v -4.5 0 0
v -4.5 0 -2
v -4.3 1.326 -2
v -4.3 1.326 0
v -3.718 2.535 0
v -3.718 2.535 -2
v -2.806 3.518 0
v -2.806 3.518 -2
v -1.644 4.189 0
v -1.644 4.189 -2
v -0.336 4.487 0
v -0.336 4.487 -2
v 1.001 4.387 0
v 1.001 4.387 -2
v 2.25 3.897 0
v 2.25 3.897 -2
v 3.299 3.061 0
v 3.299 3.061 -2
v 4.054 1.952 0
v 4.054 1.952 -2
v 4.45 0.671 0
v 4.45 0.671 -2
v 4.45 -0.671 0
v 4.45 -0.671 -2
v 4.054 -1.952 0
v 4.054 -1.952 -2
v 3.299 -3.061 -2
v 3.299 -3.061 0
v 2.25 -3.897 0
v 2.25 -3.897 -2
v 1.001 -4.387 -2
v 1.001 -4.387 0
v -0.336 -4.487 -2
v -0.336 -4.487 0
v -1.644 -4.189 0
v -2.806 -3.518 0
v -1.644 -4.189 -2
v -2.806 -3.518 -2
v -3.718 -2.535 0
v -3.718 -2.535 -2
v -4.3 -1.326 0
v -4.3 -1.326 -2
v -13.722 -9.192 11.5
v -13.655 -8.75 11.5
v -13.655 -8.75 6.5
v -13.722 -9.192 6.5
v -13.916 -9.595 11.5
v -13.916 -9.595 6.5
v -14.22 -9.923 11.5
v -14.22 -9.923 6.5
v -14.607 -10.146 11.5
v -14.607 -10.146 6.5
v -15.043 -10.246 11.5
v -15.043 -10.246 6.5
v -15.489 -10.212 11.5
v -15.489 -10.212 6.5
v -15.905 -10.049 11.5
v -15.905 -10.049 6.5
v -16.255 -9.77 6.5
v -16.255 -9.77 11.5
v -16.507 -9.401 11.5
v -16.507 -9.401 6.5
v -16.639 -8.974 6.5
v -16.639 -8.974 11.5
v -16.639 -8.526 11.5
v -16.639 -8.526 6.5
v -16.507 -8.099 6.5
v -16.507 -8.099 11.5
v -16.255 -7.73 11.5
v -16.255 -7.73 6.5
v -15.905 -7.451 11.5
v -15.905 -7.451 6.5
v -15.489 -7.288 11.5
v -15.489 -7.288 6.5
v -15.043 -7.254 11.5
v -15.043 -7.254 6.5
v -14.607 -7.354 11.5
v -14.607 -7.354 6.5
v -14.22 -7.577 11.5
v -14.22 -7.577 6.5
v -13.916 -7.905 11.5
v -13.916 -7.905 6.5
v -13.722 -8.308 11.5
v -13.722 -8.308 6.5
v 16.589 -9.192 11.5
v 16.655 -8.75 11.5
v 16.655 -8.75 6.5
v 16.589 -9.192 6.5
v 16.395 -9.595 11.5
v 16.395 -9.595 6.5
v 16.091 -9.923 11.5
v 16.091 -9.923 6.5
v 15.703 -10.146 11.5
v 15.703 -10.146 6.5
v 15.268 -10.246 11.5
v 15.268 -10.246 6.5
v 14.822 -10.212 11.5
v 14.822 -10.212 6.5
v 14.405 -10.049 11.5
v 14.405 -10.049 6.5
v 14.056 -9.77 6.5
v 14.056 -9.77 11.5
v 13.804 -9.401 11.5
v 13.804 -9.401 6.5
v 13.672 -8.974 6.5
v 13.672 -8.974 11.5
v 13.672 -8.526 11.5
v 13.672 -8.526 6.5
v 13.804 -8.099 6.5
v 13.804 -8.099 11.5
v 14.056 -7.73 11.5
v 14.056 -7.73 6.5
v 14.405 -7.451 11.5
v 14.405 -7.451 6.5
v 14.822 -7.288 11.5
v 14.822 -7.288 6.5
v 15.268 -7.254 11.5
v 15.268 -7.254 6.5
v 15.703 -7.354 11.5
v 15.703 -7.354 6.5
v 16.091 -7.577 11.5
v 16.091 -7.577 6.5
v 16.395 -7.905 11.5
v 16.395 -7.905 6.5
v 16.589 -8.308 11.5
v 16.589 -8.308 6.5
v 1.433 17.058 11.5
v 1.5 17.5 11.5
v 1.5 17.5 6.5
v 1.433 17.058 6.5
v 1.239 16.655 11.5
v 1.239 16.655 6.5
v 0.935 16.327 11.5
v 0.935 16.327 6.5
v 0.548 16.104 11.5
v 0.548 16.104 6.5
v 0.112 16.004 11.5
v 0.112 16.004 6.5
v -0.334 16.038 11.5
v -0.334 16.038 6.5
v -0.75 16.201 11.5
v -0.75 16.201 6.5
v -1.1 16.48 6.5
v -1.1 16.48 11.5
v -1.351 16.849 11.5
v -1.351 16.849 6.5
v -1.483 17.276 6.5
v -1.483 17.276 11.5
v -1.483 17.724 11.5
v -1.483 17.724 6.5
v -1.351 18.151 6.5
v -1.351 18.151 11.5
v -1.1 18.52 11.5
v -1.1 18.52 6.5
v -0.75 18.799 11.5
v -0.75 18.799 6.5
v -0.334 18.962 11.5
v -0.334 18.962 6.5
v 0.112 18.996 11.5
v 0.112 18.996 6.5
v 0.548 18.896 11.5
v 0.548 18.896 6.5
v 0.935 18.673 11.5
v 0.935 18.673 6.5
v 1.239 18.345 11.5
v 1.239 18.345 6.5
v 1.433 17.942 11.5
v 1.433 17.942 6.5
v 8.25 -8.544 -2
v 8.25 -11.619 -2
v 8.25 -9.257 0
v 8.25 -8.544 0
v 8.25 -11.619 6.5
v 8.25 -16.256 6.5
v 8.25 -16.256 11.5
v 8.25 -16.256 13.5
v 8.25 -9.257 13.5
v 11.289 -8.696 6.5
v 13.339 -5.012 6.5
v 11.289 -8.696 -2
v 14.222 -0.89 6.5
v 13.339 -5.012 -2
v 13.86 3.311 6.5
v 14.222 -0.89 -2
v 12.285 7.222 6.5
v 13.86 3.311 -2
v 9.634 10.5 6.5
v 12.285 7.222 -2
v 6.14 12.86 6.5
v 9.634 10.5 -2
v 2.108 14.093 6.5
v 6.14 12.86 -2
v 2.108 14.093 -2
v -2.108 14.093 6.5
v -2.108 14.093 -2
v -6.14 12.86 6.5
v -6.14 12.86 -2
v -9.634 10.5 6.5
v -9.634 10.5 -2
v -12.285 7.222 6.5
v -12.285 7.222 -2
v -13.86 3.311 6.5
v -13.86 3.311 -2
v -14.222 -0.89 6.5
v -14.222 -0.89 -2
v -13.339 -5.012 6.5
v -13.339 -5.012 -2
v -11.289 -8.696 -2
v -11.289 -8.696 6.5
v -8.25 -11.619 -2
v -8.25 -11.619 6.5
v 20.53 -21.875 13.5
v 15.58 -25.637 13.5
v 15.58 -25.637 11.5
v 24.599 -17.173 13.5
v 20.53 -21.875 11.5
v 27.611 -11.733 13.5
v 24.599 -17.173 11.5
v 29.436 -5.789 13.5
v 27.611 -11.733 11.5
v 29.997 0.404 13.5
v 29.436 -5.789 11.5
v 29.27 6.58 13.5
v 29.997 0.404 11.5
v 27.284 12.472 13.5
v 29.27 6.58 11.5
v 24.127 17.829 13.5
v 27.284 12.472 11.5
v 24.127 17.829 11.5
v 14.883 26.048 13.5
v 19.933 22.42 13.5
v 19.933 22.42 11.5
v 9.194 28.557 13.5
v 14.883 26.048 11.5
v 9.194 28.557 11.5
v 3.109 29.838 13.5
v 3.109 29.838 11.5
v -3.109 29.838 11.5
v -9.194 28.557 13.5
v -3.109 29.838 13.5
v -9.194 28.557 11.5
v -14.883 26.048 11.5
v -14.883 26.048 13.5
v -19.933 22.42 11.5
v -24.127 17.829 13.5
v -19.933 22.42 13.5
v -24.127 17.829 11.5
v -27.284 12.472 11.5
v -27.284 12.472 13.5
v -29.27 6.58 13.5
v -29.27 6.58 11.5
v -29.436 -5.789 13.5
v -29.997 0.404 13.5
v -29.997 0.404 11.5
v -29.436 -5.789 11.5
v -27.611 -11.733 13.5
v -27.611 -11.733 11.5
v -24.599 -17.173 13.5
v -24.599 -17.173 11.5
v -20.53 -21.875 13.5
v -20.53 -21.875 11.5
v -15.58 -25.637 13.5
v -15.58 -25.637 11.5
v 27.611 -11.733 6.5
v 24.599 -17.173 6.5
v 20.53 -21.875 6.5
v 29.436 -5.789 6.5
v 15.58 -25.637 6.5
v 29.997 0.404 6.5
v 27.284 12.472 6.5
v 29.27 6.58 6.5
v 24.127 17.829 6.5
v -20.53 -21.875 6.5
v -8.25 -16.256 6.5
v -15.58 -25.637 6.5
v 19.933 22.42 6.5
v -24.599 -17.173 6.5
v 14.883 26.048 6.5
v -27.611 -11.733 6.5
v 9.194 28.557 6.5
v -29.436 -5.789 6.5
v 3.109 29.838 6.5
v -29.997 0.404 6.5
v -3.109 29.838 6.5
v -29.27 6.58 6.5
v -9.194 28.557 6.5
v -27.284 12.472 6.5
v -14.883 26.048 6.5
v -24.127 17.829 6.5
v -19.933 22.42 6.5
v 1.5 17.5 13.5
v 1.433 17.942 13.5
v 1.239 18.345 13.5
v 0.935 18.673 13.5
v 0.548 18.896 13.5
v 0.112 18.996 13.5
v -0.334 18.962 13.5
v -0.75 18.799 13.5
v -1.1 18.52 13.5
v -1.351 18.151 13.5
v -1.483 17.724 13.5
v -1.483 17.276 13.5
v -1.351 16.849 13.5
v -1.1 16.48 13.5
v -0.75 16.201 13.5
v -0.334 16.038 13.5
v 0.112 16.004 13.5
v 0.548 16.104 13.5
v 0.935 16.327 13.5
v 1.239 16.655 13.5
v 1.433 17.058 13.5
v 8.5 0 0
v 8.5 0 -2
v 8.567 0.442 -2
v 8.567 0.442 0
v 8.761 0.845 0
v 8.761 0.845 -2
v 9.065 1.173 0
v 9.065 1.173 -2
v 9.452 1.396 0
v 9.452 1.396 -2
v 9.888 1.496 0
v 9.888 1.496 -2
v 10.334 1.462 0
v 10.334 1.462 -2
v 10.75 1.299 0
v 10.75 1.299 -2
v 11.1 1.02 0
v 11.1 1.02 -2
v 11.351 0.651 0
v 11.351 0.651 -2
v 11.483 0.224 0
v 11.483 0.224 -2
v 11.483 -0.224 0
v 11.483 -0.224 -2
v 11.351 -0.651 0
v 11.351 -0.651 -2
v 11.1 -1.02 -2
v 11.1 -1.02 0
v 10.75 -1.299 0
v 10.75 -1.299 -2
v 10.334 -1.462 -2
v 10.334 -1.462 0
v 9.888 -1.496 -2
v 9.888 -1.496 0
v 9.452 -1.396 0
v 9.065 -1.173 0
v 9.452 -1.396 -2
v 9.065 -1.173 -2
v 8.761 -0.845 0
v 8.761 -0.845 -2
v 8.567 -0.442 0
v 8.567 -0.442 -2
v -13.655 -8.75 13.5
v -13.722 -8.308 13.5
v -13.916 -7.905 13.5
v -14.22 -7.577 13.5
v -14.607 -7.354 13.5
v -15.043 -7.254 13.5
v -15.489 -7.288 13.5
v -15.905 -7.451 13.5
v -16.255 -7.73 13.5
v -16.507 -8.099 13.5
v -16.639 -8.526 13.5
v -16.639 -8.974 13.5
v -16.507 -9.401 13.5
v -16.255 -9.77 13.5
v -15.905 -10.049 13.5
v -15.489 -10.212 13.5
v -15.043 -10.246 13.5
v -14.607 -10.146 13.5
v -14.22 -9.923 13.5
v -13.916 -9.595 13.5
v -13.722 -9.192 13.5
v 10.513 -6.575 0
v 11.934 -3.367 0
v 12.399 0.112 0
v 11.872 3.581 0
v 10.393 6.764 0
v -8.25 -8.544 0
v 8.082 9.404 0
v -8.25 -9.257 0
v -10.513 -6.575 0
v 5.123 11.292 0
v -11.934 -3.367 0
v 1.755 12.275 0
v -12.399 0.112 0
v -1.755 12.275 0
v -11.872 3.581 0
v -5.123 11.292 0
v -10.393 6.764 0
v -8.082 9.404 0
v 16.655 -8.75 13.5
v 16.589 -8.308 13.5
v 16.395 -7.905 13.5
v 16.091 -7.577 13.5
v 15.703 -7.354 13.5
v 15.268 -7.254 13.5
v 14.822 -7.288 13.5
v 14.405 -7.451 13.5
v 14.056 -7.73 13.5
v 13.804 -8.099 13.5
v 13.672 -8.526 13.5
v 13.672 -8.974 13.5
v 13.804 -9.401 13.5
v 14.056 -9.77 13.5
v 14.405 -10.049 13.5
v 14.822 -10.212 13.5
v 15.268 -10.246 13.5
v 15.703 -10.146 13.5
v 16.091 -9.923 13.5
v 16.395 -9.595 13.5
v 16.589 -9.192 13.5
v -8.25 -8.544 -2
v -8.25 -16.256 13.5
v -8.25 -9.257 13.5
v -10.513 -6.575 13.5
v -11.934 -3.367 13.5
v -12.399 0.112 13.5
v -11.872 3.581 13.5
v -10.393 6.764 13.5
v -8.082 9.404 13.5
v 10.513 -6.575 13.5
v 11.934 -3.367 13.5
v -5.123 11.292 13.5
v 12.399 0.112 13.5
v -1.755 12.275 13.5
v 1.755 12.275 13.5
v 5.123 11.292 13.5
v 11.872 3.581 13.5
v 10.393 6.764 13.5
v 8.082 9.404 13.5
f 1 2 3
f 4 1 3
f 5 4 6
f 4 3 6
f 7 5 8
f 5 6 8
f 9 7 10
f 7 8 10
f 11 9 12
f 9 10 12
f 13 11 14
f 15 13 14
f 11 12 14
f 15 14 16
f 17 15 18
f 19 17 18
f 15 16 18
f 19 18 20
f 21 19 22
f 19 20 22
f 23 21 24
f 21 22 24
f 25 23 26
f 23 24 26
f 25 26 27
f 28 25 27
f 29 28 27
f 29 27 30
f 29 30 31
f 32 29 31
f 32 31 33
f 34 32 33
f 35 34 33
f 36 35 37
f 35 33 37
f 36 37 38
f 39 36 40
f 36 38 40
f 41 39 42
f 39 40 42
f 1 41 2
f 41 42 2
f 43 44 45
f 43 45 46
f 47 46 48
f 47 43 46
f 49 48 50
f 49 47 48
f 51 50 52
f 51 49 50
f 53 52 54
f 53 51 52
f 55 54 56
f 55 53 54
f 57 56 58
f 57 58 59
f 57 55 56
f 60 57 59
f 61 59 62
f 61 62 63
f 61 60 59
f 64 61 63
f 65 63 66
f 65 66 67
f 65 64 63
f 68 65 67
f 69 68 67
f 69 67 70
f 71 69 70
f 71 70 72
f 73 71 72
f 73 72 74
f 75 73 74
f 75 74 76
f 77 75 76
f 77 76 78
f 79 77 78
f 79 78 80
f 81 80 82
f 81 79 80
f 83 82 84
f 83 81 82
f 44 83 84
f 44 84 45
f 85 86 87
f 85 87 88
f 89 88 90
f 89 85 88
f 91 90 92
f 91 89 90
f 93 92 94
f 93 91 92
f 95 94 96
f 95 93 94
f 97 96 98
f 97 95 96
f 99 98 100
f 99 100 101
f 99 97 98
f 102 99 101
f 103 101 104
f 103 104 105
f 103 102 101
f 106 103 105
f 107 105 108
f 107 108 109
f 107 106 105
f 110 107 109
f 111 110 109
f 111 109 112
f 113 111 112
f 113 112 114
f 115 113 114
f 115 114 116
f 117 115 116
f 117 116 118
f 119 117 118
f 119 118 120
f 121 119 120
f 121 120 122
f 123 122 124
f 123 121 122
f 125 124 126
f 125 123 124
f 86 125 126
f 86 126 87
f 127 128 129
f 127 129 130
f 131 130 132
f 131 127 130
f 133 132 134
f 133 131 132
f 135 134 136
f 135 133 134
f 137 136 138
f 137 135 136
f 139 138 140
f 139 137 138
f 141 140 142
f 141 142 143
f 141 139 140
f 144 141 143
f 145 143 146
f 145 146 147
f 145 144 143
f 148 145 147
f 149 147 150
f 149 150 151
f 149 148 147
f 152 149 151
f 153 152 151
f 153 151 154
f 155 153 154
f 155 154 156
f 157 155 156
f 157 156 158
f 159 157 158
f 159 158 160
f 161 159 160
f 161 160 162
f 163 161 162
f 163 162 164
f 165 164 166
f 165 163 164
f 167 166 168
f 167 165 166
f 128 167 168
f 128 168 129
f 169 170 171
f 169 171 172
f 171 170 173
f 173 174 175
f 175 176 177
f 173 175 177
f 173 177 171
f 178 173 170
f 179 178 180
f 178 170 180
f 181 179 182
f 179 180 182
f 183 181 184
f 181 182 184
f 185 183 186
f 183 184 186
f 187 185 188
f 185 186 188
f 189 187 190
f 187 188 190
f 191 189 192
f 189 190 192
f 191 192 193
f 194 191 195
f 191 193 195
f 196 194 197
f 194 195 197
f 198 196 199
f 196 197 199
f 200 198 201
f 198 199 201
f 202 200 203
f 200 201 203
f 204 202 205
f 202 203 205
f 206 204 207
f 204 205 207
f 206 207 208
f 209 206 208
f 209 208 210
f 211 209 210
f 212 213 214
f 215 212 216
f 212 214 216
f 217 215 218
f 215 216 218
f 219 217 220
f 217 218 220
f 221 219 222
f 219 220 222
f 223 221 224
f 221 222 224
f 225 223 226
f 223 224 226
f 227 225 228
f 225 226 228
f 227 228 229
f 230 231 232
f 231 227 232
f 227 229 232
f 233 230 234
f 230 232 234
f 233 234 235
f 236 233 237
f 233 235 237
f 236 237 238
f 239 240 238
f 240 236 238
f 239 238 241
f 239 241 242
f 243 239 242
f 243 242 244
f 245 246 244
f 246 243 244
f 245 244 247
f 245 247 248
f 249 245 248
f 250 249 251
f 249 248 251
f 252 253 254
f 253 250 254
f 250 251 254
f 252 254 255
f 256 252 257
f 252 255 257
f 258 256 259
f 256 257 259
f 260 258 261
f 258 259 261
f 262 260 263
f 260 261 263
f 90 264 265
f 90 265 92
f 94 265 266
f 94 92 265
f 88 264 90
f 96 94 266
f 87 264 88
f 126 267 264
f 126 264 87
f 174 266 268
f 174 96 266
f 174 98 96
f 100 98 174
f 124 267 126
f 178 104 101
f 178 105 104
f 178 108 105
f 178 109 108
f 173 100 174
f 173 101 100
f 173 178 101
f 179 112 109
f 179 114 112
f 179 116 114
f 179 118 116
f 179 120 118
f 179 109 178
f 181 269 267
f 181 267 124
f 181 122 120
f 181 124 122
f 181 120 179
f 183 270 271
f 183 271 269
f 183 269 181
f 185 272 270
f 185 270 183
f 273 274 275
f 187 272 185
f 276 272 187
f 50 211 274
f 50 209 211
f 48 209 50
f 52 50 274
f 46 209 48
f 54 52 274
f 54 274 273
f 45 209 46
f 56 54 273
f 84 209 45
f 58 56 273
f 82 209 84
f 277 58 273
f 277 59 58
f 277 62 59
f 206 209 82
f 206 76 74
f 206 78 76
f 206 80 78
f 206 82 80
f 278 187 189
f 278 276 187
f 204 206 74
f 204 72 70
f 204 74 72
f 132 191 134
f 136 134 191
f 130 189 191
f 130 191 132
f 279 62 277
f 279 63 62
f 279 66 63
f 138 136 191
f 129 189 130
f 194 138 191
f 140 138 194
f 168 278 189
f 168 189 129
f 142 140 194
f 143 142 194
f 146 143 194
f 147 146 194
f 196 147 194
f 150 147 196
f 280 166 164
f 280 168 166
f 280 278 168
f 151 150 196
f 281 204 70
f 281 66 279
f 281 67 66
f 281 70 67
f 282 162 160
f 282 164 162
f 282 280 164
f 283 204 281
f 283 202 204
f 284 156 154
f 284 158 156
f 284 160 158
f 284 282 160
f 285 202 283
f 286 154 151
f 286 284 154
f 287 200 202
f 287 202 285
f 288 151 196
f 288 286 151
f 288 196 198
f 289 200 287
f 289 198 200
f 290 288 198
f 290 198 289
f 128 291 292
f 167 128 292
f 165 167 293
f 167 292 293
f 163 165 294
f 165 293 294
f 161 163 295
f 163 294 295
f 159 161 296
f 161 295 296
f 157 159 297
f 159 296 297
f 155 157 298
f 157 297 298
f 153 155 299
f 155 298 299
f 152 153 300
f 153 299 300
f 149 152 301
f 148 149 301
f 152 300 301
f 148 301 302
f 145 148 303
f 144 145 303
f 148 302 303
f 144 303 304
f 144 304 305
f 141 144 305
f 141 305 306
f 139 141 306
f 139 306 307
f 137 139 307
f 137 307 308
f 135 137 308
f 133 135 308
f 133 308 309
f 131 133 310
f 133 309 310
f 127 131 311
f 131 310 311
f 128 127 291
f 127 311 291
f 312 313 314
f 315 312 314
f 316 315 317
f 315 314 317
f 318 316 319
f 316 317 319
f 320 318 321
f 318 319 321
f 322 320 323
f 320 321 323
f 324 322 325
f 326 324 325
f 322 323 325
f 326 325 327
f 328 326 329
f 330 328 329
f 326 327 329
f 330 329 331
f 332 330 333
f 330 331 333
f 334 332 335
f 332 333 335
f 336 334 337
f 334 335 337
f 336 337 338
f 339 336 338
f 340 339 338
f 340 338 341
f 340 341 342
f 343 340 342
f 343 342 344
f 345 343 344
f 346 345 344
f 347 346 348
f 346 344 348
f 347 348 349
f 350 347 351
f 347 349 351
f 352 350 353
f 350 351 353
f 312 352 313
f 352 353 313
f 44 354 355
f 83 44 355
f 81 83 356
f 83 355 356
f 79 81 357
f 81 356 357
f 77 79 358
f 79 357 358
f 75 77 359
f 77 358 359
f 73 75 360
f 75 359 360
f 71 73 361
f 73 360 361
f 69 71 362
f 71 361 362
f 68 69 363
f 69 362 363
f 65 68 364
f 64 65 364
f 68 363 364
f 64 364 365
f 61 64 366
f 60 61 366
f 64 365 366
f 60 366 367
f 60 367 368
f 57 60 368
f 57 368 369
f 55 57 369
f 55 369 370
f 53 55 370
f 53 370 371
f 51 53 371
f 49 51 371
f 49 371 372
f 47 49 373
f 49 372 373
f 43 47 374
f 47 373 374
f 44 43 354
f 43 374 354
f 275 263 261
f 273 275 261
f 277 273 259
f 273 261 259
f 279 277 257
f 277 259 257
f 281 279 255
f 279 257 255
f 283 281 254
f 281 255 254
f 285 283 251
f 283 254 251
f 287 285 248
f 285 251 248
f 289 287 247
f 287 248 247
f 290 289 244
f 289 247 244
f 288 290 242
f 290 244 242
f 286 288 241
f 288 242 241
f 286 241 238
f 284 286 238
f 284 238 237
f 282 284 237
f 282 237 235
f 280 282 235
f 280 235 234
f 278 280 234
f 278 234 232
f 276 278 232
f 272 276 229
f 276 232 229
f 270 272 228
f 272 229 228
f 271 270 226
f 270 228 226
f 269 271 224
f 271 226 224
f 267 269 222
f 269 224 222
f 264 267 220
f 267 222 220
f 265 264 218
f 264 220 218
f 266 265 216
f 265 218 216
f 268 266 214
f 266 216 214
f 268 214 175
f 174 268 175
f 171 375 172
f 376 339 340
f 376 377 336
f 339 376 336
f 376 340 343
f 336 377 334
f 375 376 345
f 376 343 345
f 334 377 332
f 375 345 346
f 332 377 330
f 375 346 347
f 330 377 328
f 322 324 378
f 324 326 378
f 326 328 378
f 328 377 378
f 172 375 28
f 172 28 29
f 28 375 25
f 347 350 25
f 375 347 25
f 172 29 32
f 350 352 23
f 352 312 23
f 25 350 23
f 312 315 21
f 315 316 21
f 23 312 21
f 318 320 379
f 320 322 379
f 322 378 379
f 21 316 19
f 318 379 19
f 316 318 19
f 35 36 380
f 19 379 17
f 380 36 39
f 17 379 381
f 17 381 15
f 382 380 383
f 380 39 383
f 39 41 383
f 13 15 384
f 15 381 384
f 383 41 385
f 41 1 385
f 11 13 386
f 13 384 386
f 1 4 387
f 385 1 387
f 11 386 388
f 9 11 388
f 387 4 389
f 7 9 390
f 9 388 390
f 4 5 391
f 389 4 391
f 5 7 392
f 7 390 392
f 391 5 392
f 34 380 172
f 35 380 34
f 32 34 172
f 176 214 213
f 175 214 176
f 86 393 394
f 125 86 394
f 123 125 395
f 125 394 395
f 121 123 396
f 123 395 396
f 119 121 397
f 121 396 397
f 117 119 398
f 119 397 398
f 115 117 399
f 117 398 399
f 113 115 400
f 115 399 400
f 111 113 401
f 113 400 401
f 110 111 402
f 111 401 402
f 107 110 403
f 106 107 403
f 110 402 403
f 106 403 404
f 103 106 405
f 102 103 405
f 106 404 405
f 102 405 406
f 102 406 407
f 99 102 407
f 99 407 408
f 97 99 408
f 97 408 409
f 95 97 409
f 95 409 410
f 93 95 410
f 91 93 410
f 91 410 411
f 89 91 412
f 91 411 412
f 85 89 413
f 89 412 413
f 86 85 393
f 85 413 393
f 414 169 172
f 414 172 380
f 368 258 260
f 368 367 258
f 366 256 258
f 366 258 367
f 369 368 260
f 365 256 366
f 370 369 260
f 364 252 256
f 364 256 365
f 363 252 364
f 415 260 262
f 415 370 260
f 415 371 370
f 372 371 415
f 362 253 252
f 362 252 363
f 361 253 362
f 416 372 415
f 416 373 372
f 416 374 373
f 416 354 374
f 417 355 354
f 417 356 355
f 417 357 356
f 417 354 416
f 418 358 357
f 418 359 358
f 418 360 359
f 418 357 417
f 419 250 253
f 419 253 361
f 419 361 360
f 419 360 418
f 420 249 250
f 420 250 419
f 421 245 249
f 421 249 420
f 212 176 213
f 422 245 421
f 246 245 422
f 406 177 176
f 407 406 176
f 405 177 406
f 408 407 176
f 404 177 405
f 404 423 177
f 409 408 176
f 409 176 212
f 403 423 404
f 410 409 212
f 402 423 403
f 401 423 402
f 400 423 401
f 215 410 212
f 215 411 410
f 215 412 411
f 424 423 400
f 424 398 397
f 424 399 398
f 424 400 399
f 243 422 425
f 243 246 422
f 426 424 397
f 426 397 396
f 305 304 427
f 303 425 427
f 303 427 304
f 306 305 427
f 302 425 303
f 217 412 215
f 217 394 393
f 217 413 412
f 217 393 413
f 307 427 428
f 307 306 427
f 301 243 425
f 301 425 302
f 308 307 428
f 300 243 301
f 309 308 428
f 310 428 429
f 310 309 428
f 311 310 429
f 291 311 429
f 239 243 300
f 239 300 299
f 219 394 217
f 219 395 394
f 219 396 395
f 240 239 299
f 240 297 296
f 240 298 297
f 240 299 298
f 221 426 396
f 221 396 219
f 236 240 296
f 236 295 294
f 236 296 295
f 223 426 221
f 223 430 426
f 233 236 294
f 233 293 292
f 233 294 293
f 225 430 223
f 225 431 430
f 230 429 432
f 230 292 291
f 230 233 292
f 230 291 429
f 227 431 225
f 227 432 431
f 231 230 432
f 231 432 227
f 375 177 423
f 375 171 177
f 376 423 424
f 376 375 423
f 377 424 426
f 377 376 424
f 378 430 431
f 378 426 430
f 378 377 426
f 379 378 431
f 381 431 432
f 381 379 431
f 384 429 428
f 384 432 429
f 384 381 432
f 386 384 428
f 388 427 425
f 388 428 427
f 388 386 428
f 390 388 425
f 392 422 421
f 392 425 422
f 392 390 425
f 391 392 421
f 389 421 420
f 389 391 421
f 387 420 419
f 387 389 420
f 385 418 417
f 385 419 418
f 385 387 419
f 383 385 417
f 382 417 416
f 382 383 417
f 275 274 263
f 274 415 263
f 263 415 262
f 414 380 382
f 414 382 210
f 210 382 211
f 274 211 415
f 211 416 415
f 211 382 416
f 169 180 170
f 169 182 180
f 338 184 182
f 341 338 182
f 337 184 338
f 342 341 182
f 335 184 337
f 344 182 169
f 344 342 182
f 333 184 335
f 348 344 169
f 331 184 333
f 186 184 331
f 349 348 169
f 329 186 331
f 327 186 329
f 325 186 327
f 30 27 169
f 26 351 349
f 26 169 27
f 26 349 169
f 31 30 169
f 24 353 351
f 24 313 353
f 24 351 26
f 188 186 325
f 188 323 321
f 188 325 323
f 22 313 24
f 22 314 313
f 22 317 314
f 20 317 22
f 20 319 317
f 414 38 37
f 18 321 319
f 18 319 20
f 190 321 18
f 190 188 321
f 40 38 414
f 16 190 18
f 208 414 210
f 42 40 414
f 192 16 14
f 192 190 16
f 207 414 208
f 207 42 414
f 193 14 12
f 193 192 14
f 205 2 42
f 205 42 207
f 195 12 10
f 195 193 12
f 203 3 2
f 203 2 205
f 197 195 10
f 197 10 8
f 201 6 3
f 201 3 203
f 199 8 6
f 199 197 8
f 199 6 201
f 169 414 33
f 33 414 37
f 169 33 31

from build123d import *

# Parameters (mm, degrees)
SKETCH_1_R               = 14.25
SKETCH_1_R_2             = 12.4
EXTRUDE_1_DEPTH          = 13.5
EXTRUDE_START            = 2
SKETCH_2_R               = 14.25
SKETCH_2_R_2             = 4.5
SKETCH_2_R_3             = 1.5
EXTRUDE_2_DEPTH          = 2
EXTRUDE_START_2          = -2
SKETCH_5_R               = 30
SKETCH_5_R_2             = 12.4
EXTRUDE_3_DEPTH          = 2
CUT_EXTRUDE_2_DEPTH      = 2
CUT_EXTRUDE_2_DEPTH_BACK = 19
SKETCH_6_R               = 1.5
CUT_EXTRUDE_3_DEPTH      = 2
SKETCH_8_R               = 1.5
EXTRUDE_4_DEPTH          = 5


with BuildPart() as part:
    # 草图1 → 凸台-拉伸1 (new body)
    with BuildSketch(Plane.XY):
        Circle(SKETCH_1_R)
        Circle(SKETCH_1_R_2, mode=Mode.SUBTRACT)
    extrude(amount=EXTRUDE_1_DEPTH)

    # 草图2 → 凸台-拉伸2 (add)
    with BuildSketch(Plane(origin=(0, 0, 0), x_dir=(-1, 0, 0), z_dir=(0, 0, -1)).offset(EXTRUDE_START)):
        Circle(SKETCH_2_R)
        Circle(SKETCH_2_R_2, mode=Mode.SUBTRACT)
        with Locations((-10, 0)):
            Circle(SKETCH_2_R_3, mode=Mode.SUBTRACT)
    extrude(amount=-EXTRUDE_2_DEPTH)

    # 草图5 → 凸台-拉伸3 (add)
    with BuildSketch(Plane.XY.offset(13.5).offset(EXTRUDE_START_2)):
        Circle(SKETCH_5_R)
        Circle(SKETCH_5_R_2, mode=Mode.SUBTRACT)
    extrude(amount=EXTRUDE_3_DEPTH)

    # 草图4 → 切除-拉伸2 (cut, two sides: drawn at the far end of the back side and taken through both)
    with BuildSketch(Plane.XY.offset(13.5).offset(-CUT_EXTRUDE_2_DEPTH_BACK)):
        Polygon((-8.25, -16.255900921), (-15.579618383, -25.637384637), (-4.242821572, -33.778563125), (18.383281344, -29.225909584), (8.25, -16.255900921), (8.25, -8.544099079), (-8.25, -8.544099079), align=None)
    extrude(amount=CUT_EXTRUDE_2_DEPTH + CUT_EXTRUDE_2_DEPTH_BACK, mode=Mode.SUBTRACT)

    # 草图6 → 切除-拉伸3 (cut)
    with BuildSketch(Plane.XY.offset(13.5)):
        with Locations((0, 17.5)):
            Circle(SKETCH_6_R)
        with Locations((15.155444566, -8.75)):
            Circle(SKETCH_6_R)
        with Locations((-15.155444566, -8.75)):
            Circle(SKETCH_6_R)
    extrude(amount=-CUT_EXTRUDE_3_DEPTH, mode=Mode.SUBTRACT)

    # 草图8 → 凸台-拉伸4 (add)
    with BuildSketch(Plane(origin=(0, 0, 11.5), x_dir=(-1, 0, 0), z_dir=(0, 0, -1))):
        with BuildLine():
            Line((8.25, -11.618950039), (8.25, -16.255900921))
            Line((8.25, -16.255900921), (15.579618383, -25.637384637))
            ThreePointArc((15.579618383, -25.637384637), (0, 30), (-15.579618383, -25.637384637))
            Line((-15.579618383, -25.637384637), (-8.25, -16.255900921))
            Line((-8.25, -16.255900921), (-8.25, -11.618950039))
            ThreePointArc((-8.25, -11.618950039), (0, 14.25), (8.25, -11.618950039))
        make_face()
        with Locations(Location((0, 17.5, 0), (0, 0, 180))):
            Circle(SKETCH_8_R, mode=Mode.SUBTRACT)
        with Locations(Location((-15.155444566, -8.75, 0), (0, 0, 180))):
            Circle(SKETCH_8_R, mode=Mode.SUBTRACT)
        with Locations(Location((15.155444566, -8.75, 0), (0, 0, 180))):
            Circle(SKETCH_8_R, mode=Mode.SUBTRACT)
    extrude(amount=EXTRUDE_4_DEPTH)


solid = part.part
